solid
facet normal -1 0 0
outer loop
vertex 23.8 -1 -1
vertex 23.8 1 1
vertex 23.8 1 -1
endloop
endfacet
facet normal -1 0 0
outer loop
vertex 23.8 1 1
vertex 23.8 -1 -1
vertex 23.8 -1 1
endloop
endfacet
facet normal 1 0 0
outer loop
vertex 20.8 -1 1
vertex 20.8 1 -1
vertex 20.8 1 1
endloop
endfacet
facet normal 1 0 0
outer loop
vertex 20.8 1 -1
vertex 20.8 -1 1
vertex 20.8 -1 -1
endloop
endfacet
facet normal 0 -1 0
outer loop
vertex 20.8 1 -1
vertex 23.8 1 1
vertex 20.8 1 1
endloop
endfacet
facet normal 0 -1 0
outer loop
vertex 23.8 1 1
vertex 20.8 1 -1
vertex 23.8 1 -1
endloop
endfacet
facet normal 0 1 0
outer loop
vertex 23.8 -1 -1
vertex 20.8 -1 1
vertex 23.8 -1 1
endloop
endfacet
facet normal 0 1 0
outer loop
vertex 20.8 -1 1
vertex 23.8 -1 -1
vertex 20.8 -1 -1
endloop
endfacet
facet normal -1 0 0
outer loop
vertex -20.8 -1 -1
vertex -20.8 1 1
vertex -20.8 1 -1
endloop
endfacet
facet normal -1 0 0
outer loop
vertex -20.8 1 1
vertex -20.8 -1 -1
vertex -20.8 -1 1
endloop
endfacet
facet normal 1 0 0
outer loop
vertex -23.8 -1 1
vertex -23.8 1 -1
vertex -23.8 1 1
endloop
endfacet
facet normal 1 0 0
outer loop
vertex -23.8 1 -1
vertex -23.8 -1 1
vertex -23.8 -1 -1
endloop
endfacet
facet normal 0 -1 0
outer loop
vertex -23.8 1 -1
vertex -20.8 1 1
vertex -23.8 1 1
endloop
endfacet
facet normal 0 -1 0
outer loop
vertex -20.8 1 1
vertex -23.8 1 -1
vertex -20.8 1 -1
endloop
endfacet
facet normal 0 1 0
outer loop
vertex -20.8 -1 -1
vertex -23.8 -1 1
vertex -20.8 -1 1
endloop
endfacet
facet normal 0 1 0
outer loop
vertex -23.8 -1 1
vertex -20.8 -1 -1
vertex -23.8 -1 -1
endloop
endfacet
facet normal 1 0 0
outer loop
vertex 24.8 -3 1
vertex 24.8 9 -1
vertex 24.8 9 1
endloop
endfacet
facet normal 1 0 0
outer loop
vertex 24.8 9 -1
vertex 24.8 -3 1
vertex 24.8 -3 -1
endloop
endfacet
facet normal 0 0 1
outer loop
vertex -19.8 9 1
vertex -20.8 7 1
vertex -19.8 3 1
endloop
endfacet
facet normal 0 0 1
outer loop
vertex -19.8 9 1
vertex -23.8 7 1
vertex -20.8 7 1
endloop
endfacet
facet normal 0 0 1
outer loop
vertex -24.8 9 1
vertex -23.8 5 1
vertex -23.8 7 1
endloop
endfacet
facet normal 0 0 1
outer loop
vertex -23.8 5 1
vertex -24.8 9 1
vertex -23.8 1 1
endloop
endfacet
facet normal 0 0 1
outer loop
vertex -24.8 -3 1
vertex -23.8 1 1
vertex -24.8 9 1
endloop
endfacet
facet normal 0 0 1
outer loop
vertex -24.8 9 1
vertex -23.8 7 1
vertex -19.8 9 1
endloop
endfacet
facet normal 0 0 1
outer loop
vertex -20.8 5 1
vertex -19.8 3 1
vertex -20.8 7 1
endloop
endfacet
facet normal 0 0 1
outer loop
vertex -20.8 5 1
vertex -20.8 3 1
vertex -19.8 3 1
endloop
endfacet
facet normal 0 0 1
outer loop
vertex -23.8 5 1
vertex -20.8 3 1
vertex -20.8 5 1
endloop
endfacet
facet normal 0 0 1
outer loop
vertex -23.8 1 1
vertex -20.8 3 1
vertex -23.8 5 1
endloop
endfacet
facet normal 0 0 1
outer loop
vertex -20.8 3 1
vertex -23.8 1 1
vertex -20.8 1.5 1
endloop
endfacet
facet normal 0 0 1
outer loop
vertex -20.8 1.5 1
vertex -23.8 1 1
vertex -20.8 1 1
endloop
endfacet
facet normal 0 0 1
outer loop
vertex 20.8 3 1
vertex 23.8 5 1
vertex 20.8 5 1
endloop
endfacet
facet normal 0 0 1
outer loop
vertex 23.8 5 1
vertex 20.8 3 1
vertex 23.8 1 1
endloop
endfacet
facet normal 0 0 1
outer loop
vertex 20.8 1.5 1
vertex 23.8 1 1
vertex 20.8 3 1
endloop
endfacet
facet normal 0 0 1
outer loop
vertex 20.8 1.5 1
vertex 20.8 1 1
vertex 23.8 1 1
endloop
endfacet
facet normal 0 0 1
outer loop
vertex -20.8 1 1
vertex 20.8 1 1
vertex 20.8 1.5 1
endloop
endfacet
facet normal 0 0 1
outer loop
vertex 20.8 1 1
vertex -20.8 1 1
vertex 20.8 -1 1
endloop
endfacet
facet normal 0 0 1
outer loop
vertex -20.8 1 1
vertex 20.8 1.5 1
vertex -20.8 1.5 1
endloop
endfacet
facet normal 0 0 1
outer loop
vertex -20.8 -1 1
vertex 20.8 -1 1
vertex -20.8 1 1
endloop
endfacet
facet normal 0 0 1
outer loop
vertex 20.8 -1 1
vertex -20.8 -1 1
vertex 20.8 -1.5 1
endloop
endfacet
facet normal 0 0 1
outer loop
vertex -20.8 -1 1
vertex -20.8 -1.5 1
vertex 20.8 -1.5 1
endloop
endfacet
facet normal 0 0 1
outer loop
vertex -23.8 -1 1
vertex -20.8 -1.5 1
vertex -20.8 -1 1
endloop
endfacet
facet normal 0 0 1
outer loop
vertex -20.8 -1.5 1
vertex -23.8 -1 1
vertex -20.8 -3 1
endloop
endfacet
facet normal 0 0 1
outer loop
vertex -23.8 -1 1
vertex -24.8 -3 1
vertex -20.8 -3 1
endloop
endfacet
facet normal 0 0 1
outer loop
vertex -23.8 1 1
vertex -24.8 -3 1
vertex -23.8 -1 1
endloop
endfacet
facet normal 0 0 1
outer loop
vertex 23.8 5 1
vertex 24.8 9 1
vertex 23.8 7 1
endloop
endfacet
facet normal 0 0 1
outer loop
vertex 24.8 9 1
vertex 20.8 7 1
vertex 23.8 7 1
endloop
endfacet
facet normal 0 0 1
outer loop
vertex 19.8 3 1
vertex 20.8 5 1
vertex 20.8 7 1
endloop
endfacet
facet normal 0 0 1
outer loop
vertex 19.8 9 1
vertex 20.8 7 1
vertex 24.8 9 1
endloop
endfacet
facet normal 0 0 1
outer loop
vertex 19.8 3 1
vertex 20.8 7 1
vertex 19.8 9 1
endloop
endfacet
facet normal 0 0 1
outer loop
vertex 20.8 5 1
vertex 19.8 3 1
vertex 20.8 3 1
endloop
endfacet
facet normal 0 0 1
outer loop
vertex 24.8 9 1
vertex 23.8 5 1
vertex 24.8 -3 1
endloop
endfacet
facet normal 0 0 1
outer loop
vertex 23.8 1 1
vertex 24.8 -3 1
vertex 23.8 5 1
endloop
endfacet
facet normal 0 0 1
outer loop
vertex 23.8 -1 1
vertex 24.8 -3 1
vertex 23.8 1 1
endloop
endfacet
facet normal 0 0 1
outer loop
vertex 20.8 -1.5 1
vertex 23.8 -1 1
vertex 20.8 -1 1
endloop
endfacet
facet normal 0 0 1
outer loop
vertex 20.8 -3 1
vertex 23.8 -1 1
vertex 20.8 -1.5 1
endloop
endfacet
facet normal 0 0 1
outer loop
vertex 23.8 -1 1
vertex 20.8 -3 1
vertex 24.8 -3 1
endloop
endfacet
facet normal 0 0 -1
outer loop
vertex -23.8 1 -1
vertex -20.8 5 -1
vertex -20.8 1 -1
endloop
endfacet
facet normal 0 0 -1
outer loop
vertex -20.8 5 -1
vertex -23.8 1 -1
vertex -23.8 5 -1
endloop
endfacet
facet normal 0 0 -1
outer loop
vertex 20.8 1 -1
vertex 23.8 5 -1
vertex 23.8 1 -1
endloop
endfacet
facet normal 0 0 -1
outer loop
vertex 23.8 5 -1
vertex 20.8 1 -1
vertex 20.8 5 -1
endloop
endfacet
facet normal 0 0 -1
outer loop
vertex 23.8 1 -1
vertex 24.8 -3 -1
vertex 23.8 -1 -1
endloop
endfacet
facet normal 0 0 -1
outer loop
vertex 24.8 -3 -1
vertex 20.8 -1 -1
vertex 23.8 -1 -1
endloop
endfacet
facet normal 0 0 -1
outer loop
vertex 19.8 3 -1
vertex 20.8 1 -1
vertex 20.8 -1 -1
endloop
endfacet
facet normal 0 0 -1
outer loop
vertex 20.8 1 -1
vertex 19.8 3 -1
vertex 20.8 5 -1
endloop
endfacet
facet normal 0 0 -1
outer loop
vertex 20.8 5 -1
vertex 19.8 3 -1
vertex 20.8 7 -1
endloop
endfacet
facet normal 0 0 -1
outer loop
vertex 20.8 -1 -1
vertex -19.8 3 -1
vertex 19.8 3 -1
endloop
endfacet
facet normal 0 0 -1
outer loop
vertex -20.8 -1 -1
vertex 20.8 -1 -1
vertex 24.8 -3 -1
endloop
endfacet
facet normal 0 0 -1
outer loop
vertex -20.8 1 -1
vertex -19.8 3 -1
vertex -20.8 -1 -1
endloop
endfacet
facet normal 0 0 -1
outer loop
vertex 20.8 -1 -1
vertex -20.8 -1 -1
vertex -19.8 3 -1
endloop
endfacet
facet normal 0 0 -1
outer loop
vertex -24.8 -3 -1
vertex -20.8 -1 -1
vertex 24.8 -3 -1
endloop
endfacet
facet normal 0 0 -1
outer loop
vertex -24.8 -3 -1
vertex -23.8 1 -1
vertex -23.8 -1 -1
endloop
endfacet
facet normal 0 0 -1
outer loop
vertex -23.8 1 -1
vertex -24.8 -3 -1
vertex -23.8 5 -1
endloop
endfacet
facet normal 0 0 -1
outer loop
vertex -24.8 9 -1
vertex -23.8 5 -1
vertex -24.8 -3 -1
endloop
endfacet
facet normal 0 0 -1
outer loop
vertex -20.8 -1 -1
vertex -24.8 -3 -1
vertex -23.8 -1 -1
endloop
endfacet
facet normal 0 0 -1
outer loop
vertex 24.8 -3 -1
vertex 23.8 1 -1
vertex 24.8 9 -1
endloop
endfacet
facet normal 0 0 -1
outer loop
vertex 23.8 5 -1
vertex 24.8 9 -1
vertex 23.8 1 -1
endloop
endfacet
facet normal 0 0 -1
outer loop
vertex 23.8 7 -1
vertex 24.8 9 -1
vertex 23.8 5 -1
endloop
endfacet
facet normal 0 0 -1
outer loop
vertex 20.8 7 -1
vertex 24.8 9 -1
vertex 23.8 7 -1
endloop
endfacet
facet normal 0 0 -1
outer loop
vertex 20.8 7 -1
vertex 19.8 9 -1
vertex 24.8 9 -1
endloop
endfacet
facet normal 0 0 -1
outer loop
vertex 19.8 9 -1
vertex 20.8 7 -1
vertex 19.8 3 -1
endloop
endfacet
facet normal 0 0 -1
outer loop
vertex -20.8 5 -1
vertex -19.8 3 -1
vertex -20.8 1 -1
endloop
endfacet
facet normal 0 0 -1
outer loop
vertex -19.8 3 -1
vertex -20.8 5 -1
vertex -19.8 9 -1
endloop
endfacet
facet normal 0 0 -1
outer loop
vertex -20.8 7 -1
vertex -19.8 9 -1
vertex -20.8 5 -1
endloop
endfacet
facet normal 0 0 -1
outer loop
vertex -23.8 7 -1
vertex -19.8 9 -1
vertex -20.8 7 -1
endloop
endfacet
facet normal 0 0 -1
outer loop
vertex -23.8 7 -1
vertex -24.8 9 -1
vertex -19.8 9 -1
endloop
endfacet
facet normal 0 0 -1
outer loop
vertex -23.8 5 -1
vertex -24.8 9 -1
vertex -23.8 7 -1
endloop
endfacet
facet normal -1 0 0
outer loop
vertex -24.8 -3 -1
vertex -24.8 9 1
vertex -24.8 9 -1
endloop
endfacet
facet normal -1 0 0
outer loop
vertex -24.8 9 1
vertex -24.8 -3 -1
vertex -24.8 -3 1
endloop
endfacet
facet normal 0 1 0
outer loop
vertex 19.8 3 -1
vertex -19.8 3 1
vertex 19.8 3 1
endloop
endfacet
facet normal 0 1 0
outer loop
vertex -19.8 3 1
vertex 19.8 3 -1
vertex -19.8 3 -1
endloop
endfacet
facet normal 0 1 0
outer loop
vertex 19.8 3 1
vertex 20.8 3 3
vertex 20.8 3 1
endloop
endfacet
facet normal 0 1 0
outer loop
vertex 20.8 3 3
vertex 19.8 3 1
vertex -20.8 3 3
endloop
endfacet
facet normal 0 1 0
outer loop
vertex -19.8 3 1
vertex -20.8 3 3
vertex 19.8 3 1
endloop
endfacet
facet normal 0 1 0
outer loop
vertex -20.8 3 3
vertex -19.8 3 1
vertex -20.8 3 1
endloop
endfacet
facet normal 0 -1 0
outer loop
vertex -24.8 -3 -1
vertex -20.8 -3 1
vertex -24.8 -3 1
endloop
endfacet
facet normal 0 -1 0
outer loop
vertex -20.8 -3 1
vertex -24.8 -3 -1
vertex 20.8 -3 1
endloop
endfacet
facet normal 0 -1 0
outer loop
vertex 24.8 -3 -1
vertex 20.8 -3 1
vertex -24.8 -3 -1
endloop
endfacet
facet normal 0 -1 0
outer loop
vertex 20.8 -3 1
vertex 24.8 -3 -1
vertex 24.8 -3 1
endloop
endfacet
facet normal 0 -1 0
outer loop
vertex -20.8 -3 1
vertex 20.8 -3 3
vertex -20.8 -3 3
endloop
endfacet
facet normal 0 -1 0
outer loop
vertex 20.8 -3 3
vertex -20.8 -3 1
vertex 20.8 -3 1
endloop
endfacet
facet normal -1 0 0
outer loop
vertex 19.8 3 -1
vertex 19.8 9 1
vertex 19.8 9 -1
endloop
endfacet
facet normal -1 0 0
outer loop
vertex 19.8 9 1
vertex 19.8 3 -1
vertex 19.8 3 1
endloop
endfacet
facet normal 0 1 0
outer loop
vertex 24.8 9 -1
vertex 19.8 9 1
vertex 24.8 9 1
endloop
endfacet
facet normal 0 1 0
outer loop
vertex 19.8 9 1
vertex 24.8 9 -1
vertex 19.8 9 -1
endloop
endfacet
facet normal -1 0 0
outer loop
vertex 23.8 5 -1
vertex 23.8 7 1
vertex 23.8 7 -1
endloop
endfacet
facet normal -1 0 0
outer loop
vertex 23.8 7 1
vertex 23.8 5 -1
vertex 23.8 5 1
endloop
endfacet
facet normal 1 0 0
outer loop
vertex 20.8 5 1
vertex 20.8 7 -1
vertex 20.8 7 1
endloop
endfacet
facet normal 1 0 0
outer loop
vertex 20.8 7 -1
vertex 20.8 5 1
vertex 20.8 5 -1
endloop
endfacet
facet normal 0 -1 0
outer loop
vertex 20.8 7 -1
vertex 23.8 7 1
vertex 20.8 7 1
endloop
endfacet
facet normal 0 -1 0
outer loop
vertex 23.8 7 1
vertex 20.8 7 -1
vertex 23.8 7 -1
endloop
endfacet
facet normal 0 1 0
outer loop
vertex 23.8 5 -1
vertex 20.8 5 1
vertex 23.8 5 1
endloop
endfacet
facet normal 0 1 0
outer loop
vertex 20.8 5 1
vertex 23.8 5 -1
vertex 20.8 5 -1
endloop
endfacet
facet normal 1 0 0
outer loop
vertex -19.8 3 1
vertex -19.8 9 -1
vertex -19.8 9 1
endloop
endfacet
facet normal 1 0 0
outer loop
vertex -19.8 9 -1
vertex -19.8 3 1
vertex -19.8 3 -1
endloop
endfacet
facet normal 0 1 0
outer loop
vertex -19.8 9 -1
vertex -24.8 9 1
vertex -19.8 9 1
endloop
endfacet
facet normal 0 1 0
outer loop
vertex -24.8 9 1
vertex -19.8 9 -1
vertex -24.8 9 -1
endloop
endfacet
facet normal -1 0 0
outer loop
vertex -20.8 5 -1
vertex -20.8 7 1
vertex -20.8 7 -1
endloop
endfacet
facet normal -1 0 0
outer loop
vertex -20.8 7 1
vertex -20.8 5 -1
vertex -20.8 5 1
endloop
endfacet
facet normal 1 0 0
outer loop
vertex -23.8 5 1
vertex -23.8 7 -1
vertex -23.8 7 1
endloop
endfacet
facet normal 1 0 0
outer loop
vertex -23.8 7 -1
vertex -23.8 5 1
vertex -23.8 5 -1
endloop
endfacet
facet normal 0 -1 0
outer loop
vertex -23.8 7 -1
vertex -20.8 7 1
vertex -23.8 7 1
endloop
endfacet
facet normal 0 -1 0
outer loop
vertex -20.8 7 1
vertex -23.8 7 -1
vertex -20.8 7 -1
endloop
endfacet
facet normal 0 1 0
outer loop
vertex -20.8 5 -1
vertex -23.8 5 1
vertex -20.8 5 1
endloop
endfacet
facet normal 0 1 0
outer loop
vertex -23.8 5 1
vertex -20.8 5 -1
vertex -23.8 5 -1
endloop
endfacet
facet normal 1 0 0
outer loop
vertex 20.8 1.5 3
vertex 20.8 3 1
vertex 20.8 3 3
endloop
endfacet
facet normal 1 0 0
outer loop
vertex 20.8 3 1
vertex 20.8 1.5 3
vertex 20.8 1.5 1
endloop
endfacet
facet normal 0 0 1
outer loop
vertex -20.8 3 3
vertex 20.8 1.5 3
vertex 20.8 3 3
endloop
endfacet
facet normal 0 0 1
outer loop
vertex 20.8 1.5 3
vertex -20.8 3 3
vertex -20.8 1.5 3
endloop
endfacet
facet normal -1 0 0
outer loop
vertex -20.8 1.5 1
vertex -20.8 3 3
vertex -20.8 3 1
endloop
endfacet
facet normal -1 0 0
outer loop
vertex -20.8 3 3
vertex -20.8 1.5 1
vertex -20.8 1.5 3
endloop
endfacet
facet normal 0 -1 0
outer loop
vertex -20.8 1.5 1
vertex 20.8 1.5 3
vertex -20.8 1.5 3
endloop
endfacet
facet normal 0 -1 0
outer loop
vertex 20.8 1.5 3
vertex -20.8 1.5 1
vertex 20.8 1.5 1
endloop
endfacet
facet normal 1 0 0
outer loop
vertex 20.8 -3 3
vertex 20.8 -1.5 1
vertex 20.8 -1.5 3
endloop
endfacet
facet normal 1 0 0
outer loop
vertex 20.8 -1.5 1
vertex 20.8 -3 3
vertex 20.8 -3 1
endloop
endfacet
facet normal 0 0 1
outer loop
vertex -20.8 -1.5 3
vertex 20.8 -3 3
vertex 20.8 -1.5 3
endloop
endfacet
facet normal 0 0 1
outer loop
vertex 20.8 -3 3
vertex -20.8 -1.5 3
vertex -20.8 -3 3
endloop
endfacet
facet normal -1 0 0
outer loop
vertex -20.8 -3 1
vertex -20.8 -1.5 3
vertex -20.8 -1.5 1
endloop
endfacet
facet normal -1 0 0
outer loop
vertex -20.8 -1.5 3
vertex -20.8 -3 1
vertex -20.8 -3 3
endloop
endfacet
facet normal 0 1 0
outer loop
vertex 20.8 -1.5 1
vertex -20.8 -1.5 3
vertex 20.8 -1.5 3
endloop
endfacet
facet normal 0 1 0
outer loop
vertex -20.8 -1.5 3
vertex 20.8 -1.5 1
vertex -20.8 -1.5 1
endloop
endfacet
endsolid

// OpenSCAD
outer_width = 20.8;
wire_mount_length = 4;
wire_mount_hole = 3;
stick_width = 6;
stick_thickness = 2;

wire_hole_y = 2;

wall_y = 1.5;
wall_z = stick_thickness;

additional_wire_hole_length = wire_mount_length + 1;

union()
{
    // Main stick and wire hole
    difference()
    {
        cube([2 * (outer_width + wire_mount_length), stick_width, stick_thickness], true);
        union()
        {
            translate([outer_width + wire_mount_hole / 2, 0, 0])
                cube([wire_mount_hole, wire_hole_y, stick_thickness + 1], true);
            translate([-(outer_width + wire_mount_hole / 2), 0, 0])
                cube([wire_mount_hole, wire_hole_y, stick_thickness + 1], true);
        }
    }
    
    // Wall formation
    translate([0, (stick_width - wall_y) / 2, (stick_thickness + wall_z) / 2])
        cube([2 * outer_width, wall_y, wall_z], true);
    translate([0, -(stick_width - wall_y) / 2, (stick_thickness + wall_z) / 2])
        cube([2 * outer_width, wall_y, wall_z], true);
    
    // 2nd wire hole
    difference()
    {
        translate([outer_width + 1.5, stick_width, 0])
            cube([additional_wire_hole_length, stick_width, stick_thickness], true);
        translate([outer_width + wire_mount_hole / 2, stick_width, 0])
                cube([wire_mount_hole, wire_hole_y, stick_thickness + 1], true);
    }
    difference()
    {
        translate([-(outer_width + 1.5), stick_width, 0])
            cube([additional_wire_hole_length, stick_width, stick_thickness], true);
        translate([-(outer_width + wire_mount_hole / 2), stick_width, 0])
                cube([wire_mount_hole, wire_hole_y, stick_thickness + 1], true);
    }
}
